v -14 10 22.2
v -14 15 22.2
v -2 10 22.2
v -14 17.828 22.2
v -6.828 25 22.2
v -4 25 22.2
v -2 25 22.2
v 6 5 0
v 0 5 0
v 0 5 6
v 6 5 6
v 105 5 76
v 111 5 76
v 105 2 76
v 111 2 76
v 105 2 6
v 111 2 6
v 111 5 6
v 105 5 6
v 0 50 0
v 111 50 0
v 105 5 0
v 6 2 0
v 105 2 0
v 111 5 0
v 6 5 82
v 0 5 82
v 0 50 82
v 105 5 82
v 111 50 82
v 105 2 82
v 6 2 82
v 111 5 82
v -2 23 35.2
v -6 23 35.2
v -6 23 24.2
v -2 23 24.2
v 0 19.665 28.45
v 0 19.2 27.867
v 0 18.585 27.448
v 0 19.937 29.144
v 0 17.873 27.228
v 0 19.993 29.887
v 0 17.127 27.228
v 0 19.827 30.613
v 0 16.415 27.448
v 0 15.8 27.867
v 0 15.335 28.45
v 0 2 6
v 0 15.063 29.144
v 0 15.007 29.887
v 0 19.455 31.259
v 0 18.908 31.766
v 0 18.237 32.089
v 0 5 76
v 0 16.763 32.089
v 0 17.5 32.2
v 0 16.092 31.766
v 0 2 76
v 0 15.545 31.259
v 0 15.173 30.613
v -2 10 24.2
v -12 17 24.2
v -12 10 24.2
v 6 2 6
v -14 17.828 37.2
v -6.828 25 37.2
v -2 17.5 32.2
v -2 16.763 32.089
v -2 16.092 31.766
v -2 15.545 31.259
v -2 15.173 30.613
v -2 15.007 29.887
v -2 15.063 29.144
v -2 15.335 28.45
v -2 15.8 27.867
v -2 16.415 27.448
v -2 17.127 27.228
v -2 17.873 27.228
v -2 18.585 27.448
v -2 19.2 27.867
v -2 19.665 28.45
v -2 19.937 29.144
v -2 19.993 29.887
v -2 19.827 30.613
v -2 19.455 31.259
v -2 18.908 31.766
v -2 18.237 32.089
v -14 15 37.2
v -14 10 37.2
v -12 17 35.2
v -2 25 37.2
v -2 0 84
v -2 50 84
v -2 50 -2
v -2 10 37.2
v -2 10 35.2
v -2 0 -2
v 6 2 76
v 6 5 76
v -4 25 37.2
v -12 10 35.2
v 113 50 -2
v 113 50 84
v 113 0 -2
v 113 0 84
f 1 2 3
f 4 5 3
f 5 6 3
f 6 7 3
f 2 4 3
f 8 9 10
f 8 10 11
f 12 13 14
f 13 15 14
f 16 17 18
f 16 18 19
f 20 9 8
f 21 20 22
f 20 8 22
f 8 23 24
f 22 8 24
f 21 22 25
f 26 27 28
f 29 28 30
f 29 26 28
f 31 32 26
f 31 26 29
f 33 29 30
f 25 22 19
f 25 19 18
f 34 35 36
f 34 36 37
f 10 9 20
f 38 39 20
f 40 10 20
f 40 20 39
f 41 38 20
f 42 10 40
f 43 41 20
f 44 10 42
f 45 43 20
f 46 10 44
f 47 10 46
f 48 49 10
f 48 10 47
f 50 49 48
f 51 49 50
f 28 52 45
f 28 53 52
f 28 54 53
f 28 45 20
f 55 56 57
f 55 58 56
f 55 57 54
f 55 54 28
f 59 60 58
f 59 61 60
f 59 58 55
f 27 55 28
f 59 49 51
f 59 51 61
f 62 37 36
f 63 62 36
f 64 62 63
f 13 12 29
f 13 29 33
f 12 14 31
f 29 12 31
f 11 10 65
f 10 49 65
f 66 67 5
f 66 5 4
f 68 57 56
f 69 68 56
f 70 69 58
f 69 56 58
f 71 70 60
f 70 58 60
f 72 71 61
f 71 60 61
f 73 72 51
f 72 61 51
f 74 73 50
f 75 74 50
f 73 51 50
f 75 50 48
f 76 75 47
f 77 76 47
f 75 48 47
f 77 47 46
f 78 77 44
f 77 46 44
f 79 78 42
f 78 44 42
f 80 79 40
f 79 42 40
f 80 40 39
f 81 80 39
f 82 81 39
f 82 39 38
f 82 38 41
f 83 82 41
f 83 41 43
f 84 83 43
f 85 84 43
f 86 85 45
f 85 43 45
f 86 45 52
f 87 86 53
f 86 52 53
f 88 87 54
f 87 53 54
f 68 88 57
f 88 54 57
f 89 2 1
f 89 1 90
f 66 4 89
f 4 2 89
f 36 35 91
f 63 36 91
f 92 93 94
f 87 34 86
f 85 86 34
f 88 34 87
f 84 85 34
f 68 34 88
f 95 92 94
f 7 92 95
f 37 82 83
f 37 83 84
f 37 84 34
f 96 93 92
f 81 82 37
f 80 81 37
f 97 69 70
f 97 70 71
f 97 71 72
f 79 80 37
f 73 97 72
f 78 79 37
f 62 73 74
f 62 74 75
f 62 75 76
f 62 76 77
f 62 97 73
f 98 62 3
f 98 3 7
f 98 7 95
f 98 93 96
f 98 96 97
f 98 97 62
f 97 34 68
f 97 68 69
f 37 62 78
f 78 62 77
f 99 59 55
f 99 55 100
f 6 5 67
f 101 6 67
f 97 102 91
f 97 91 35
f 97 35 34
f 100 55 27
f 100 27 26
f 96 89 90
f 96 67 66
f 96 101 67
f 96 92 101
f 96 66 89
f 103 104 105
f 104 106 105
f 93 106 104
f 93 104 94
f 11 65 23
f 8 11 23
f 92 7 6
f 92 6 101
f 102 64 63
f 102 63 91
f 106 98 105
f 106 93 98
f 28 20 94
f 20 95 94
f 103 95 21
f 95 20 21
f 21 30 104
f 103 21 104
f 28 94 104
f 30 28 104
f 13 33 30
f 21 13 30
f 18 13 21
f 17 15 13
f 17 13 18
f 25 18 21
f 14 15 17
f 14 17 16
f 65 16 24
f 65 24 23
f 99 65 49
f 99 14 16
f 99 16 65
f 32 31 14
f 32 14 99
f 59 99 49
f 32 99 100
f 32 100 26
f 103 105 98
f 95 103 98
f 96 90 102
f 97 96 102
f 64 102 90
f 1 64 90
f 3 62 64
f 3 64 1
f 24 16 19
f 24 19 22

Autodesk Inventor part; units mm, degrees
ref_plane "YZ Plane" through (0, 0, 0) normal (1, 0, 0) x (0, 1, 0)
ref_plane "XZ Plane" through (0, 0, 0) normal (0, 1, 0) x (-1, 0, 0)
ref_plane "XY Plane" through (0, 0, 0) normal (0, 0, 1) x (1, 0, 0)
sketch "Sketch1" plane through (0, 0, 0) normal (0, 1, 0) x (-1, 0, 0)
  line L0 (0, 0) -> (-111, 0)
  line L1 (-111, 0) -> (-111, 82)
  line L2 (-111, 82) -> (0, 82)
  line L3 (0, 82) -> (0, 0)
  dimension "d0" = 111
  dimension "d1" = 82
extrude "Extrusion1" add sketch "Sketch1" along normal blind 2
sketch "Sketch2" plane through (0, 0, 0) normal (0, -1, 0) x (1, 0, 0)
  point P0 (0, 0)
sketch "Sketch3" plane through (0, 0, 0) normal (0, -1, 0) x (1, 0, 0)
  line L0 (0, 0) -> (0, 82) projected
  line L1 (0, 0) -> (0, 82)
  line L2 (0, 82) -> (-2, 82)
  line L3 (-2, 82) -> (-2, 0)
  line L4 (-2, 0) -> (0, 0)
  line L5 (-2, 0) -> (-2, -2)
  line L6 (-2, -2) -> (113, -2)
  line L7 (113, -2) -> (113, 0)
  line L8 (113, 0) -> (-2, 0)
  line L9 (113, 0) -> (113, 84)
  line L10 (113, 84) -> (111, 84)
  line L11 (111, 84) -> (111, -2)
  line L12 (111, 84) -> (-2, 84)
  line L13 (111, 82) -> (111, 0) projected
  line L14 (-2, 82) -> (111, 82)
  line L15 (111, 82) -> (111, 84)
  dimension "d4" = 2
  dimension "d5" = 2
  dimension "d6" = 115
  dimension "d7" = 2
  dimension "d8" = 84
  dimension "d9" = 2
extrude "Extrusion2" add sketch "Sketch3" against normal blind 50 contours L11 L10 L9 L8
sketch "Sketch4" plane through (0, 0, 0) normal (0, -1, 0) x (1, 0, 0)
  line L0 (111, 84) -> (111, 82) projected
  line L1 (111, 84) -> (-2, 84)
  line L2 (-2, 84) -> (-2, 82)
  line L3 (0, 82) -> (111, 82) projected
  line L4 (-2, 82) -> (111, 82)
  line L5 (111, 82) -> (111, 84)
  point P0 (0, 0)
  dimension "d12" = 113
extrude "Extrusion3" add sketch "Sketch4" against normal blind 50
sketch "Sketch5" plane through (0, 0, 0) normal (0, -1, 0) x (1, 0, 0)
  line L0 (-2, 84) -> (-2, 82) projected
  line L1 (-2, 82) -> (-2, -2)
  line L2 (-2, -2) -> (0, -2)
  line L3 (0, 0) -> (0, 82) projected
  line L4 (0, -2) -> (0, 82)
  line L5 (-2, 82) -> (0, 82) projected
  line L6 (0, 82) -> (-2, 82)
  dimension "d15" = 84
extrude "Extrusion4" add sketch "Sketch5" against normal blind 50
sketch "Sketch6" plane through (0, 0, 0) normal (0, -1, 0) x (1, 0, 0)
  line L0 (0, 0) -> (113, 0) projected
  line L1 (113, 0) -> (113, -2)
  line L2 (0, 82) -> (0, -2) projected
  line L3 (113, -2) -> (0, -2)
  line L4 (0, -2) -> (0, 0)
  dimension "d18" = 2
extrude "Extrusion5" add sketch "Sketch6" against normal blind 50
sketch "Sketch7" plane through (-2, 0, 84) normal (-1, 0, 0) x (0, 0, 1)
  circle A0 centre (-54.3, 17.5) radius 2.5
  point P0 (-84, 0)
  dimension "d21" = 5
hole "Hole1" at (-2, 17.5, 29.7) direction (1, 0, 0) diameter 5 depth 2 tip angle 118
sketch "Sketch8" plane through (-2, 0, 84) normal (-1, 0, 0) x (0, 0, 1)
  line L0 (-61.8, 10) -> (-61.8, 25)
  line L1 (-61.8, 25) -> (-46.8, 25)
  line L2 (-46.8, 25) -> (-46.8, 10)
  line L3 (-46.8, 10) -> (-61.8, 10)
  point P0 (-84, 0)
  dimension "d29" = 15
  dimension "d30" = 15
  dimension "d31" = 15
extrude "Extrusion6" add sketch "Sketch8" along normal blind 12
chamfer "Chamfer1" distance 10 angle 45 1 edges at (-14, 25, 29.7)
sketch "Sketch9" plane through (-2, 10, 22.2) normal (0, -1, 0) x (1, 0, 0)
  line L0 (0, 0) -> (0, 15) projected
  line L1 (0, 2) -> (-10, 2)
  line L2 (-12, 0) -> (-12, 15) projected
  line L3 (-10, 2) -> (-10, 13)
  line L4 (0, 15) -> (-12, 15) projected
  line L5 (-10, 13) -> (0, 13)
  line L6 (0, 13) -> (0, 2)
  point P0 (2, -22.2)
  point P1 (0, 13)
  dimension "d37" = 10
  dimension "d38" = 11
extrude "Extrusion7" cut sketch "Sketch9" against normal blind 13
sketch "Sketch10" plane through (-14, 15, 22.2) normal (-0.7071, 0.7071, 0) x (-0.7071, -0.7071, 0)
  line L0 (-14.1421, 15) -> (-14.1421, 0) projected
  line L1 (-14.1421, 0) -> (-14.1421, 15)
  line L2 (0, 0) -> (0, 15) projected
  line L3 (-14.1421, 15) -> (0, 15)
  line L4 (0, 15) -> (0, 0)
  line L5 (-14.1421, 0) -> (0, 0) projected
  line L6 (0, 0) -> (-14.1421, 0)
  point P0 (0.7071, -22.2)
extrude "Extrusion8" add sketch "Sketch10" along normal blind 2
chamfer "Chamfer2" distance 2 angle 45 1 edges at (-5.4142, 26.4142, 29.7)
chamfer "Chamfer3" distance 2 angle 45 1 edges at (-15.4142, 16.4142, 29.7)
sketch "Sketch11" plane through (0, 2, 0) normal (0, 1, 0) x (1, 0, 0)
  line L0 (0, 0) -> (0, -82) projected
  line L1 (0, 0) -> (0, -6)
  line L2 (0, -6) -> (6, -6)
  line L3 (6, -6) -> (6, 0)
  line L4 (0, 0) -> (111, 0) projected
  line L5 (6, 0) -> (0, 0)
  dimension "d49" = 6
  dimension "d50" = 6
  dimension "d51" = 6
extrude "Extrusion9" add sketch "Sketch11" along normal blind 3
sketch "Sketch12" plane through (0, 2, 0) normal (0, 1, 0) x (1, 0, 0)
  point P0 (0, 0)
sketch "Sketch13" plane through (0, 2, 0) normal (0, 1, 0) x (1, 0, 0)
  line L0 (111, 0) -> (111, -6)
  line L1 (111, 0) -> (111, -82) projected
  line L2 (111, -6) -> (105, -6)
  line L3 (105, -6) -> (105, 0)
  line L4 (0, 0) -> (111, 0) projected
  line L5 (105, 0) -> (111, 0)
  dimension "d54" = 6
  dimension "d55" = 6
extrude "Extrusion10" add sketch "Sketch13" along normal blind 3
sketch "Sketch14" plane through (0, 2, 0) normal (0, 1, 0) x (1, 0, 0)
  point P0 (0, 0)
sketch "Sketch15" plane through (0, 2, 0) normal (0, 1, 0) x (1, 0, 0)
  line L0 (0, -82) -> (111, -82) projected
  line L1 (0, -82) -> (0, -76)
  line L2 (0, -6) -> (0, -82) projected
  line L3 (0, -76) -> (6, -76)
  line L4 (6, -76) -> (6, -82)
  point P0 (0, 0)
  dimension "d58" = 6
  dimension "d59" = 6
extrude "Extrusion11" add sketch "Sketch15" along normal blind 3
sketch "Sketch16" plane through (0, 2, 0) normal (0, 1, 0) x (1, 0, 0)
  line L0 (111, -82) -> (0, -82) projected
  line L1 (111, -82) -> (111, -76)
  line L2 (111, 0) -> (111, -82) projected
  line L3 (111, -76) -> (105, -76)
  line L4 (105, -76) -> (105, -82)
  line L5 (105, -82) -> (111, -82)
  point P0 (0, 0)
  dimension "d62" = 6
  dimension "d63" = 6
extrude "Extrusion12" add sketch "Sketch16" along normal blind 3
properties part number "box"
